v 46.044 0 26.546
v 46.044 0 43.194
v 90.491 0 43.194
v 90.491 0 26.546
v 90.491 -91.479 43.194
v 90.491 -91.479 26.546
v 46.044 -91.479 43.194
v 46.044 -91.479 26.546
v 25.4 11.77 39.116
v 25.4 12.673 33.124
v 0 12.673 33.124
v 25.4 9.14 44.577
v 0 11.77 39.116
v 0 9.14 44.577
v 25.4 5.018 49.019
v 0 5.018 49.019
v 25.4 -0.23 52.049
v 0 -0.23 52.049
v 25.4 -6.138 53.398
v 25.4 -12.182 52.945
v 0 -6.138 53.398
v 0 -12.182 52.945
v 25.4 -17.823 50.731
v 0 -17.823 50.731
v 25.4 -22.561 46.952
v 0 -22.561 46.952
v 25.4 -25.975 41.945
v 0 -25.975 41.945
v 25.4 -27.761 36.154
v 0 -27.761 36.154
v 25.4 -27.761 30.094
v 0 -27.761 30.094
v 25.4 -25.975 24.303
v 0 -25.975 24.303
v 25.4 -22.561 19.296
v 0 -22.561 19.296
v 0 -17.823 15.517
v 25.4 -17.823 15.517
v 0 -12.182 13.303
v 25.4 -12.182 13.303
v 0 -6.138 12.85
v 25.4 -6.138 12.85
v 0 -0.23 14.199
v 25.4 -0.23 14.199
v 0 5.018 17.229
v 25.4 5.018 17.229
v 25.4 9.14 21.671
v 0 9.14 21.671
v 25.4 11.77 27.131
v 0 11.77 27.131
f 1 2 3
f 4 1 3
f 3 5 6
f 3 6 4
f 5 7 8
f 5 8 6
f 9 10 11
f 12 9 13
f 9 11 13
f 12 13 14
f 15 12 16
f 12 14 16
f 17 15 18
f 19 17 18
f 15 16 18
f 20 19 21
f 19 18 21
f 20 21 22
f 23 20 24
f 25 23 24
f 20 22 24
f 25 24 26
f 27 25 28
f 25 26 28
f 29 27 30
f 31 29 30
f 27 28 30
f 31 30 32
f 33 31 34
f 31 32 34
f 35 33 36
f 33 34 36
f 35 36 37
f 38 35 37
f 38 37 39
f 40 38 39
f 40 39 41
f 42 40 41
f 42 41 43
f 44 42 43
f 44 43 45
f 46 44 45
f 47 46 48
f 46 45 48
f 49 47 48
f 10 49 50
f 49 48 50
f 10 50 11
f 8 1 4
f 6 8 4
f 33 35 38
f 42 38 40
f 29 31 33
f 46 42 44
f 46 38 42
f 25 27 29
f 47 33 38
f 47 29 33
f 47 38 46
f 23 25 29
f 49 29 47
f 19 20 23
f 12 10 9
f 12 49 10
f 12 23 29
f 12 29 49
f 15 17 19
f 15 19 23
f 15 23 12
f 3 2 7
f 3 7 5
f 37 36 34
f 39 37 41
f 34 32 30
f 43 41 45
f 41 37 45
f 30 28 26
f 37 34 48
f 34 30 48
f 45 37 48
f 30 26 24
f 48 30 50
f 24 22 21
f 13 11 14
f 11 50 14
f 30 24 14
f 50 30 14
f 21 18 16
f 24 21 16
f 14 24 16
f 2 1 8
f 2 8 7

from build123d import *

# Parameters (mm, degrees)
F0_W      = 19.047439
F0_H      = 16.647756
F1_DEPTH  = 91.47881
F2_R      = 20.330527
F1_FACE_W = 91.47881
F1_FACE_H = 16.647756
F3_DEPTH  = 25.4


with BuildPart() as f1:
    # F0 (on Front) → F1 (new body)
    with BuildSketch(Plane.XZ):
        with Locations((55.567548, 34.870312)):
            Rectangle(F0_W, F0_H)
    extrude(amount=F1_DEPTH)

    # F2 (on Right) + F1_face (on face) → F3 (join)
    with BuildSketch(Plane.YZ):
        with Locations((-7.657632, 33.12394)):
            Circle(F2_R)
    with BuildSketch(Plane(origin=(65.091267, -45.739405, 34.870312), x_dir=(0, 1, 0), z_dir=(1, 0, 0))):
        Rectangle(F1_FACE_W, F1_FACE_H)
    extrude(amount=F3_DEPTH)


solid = f1.part
